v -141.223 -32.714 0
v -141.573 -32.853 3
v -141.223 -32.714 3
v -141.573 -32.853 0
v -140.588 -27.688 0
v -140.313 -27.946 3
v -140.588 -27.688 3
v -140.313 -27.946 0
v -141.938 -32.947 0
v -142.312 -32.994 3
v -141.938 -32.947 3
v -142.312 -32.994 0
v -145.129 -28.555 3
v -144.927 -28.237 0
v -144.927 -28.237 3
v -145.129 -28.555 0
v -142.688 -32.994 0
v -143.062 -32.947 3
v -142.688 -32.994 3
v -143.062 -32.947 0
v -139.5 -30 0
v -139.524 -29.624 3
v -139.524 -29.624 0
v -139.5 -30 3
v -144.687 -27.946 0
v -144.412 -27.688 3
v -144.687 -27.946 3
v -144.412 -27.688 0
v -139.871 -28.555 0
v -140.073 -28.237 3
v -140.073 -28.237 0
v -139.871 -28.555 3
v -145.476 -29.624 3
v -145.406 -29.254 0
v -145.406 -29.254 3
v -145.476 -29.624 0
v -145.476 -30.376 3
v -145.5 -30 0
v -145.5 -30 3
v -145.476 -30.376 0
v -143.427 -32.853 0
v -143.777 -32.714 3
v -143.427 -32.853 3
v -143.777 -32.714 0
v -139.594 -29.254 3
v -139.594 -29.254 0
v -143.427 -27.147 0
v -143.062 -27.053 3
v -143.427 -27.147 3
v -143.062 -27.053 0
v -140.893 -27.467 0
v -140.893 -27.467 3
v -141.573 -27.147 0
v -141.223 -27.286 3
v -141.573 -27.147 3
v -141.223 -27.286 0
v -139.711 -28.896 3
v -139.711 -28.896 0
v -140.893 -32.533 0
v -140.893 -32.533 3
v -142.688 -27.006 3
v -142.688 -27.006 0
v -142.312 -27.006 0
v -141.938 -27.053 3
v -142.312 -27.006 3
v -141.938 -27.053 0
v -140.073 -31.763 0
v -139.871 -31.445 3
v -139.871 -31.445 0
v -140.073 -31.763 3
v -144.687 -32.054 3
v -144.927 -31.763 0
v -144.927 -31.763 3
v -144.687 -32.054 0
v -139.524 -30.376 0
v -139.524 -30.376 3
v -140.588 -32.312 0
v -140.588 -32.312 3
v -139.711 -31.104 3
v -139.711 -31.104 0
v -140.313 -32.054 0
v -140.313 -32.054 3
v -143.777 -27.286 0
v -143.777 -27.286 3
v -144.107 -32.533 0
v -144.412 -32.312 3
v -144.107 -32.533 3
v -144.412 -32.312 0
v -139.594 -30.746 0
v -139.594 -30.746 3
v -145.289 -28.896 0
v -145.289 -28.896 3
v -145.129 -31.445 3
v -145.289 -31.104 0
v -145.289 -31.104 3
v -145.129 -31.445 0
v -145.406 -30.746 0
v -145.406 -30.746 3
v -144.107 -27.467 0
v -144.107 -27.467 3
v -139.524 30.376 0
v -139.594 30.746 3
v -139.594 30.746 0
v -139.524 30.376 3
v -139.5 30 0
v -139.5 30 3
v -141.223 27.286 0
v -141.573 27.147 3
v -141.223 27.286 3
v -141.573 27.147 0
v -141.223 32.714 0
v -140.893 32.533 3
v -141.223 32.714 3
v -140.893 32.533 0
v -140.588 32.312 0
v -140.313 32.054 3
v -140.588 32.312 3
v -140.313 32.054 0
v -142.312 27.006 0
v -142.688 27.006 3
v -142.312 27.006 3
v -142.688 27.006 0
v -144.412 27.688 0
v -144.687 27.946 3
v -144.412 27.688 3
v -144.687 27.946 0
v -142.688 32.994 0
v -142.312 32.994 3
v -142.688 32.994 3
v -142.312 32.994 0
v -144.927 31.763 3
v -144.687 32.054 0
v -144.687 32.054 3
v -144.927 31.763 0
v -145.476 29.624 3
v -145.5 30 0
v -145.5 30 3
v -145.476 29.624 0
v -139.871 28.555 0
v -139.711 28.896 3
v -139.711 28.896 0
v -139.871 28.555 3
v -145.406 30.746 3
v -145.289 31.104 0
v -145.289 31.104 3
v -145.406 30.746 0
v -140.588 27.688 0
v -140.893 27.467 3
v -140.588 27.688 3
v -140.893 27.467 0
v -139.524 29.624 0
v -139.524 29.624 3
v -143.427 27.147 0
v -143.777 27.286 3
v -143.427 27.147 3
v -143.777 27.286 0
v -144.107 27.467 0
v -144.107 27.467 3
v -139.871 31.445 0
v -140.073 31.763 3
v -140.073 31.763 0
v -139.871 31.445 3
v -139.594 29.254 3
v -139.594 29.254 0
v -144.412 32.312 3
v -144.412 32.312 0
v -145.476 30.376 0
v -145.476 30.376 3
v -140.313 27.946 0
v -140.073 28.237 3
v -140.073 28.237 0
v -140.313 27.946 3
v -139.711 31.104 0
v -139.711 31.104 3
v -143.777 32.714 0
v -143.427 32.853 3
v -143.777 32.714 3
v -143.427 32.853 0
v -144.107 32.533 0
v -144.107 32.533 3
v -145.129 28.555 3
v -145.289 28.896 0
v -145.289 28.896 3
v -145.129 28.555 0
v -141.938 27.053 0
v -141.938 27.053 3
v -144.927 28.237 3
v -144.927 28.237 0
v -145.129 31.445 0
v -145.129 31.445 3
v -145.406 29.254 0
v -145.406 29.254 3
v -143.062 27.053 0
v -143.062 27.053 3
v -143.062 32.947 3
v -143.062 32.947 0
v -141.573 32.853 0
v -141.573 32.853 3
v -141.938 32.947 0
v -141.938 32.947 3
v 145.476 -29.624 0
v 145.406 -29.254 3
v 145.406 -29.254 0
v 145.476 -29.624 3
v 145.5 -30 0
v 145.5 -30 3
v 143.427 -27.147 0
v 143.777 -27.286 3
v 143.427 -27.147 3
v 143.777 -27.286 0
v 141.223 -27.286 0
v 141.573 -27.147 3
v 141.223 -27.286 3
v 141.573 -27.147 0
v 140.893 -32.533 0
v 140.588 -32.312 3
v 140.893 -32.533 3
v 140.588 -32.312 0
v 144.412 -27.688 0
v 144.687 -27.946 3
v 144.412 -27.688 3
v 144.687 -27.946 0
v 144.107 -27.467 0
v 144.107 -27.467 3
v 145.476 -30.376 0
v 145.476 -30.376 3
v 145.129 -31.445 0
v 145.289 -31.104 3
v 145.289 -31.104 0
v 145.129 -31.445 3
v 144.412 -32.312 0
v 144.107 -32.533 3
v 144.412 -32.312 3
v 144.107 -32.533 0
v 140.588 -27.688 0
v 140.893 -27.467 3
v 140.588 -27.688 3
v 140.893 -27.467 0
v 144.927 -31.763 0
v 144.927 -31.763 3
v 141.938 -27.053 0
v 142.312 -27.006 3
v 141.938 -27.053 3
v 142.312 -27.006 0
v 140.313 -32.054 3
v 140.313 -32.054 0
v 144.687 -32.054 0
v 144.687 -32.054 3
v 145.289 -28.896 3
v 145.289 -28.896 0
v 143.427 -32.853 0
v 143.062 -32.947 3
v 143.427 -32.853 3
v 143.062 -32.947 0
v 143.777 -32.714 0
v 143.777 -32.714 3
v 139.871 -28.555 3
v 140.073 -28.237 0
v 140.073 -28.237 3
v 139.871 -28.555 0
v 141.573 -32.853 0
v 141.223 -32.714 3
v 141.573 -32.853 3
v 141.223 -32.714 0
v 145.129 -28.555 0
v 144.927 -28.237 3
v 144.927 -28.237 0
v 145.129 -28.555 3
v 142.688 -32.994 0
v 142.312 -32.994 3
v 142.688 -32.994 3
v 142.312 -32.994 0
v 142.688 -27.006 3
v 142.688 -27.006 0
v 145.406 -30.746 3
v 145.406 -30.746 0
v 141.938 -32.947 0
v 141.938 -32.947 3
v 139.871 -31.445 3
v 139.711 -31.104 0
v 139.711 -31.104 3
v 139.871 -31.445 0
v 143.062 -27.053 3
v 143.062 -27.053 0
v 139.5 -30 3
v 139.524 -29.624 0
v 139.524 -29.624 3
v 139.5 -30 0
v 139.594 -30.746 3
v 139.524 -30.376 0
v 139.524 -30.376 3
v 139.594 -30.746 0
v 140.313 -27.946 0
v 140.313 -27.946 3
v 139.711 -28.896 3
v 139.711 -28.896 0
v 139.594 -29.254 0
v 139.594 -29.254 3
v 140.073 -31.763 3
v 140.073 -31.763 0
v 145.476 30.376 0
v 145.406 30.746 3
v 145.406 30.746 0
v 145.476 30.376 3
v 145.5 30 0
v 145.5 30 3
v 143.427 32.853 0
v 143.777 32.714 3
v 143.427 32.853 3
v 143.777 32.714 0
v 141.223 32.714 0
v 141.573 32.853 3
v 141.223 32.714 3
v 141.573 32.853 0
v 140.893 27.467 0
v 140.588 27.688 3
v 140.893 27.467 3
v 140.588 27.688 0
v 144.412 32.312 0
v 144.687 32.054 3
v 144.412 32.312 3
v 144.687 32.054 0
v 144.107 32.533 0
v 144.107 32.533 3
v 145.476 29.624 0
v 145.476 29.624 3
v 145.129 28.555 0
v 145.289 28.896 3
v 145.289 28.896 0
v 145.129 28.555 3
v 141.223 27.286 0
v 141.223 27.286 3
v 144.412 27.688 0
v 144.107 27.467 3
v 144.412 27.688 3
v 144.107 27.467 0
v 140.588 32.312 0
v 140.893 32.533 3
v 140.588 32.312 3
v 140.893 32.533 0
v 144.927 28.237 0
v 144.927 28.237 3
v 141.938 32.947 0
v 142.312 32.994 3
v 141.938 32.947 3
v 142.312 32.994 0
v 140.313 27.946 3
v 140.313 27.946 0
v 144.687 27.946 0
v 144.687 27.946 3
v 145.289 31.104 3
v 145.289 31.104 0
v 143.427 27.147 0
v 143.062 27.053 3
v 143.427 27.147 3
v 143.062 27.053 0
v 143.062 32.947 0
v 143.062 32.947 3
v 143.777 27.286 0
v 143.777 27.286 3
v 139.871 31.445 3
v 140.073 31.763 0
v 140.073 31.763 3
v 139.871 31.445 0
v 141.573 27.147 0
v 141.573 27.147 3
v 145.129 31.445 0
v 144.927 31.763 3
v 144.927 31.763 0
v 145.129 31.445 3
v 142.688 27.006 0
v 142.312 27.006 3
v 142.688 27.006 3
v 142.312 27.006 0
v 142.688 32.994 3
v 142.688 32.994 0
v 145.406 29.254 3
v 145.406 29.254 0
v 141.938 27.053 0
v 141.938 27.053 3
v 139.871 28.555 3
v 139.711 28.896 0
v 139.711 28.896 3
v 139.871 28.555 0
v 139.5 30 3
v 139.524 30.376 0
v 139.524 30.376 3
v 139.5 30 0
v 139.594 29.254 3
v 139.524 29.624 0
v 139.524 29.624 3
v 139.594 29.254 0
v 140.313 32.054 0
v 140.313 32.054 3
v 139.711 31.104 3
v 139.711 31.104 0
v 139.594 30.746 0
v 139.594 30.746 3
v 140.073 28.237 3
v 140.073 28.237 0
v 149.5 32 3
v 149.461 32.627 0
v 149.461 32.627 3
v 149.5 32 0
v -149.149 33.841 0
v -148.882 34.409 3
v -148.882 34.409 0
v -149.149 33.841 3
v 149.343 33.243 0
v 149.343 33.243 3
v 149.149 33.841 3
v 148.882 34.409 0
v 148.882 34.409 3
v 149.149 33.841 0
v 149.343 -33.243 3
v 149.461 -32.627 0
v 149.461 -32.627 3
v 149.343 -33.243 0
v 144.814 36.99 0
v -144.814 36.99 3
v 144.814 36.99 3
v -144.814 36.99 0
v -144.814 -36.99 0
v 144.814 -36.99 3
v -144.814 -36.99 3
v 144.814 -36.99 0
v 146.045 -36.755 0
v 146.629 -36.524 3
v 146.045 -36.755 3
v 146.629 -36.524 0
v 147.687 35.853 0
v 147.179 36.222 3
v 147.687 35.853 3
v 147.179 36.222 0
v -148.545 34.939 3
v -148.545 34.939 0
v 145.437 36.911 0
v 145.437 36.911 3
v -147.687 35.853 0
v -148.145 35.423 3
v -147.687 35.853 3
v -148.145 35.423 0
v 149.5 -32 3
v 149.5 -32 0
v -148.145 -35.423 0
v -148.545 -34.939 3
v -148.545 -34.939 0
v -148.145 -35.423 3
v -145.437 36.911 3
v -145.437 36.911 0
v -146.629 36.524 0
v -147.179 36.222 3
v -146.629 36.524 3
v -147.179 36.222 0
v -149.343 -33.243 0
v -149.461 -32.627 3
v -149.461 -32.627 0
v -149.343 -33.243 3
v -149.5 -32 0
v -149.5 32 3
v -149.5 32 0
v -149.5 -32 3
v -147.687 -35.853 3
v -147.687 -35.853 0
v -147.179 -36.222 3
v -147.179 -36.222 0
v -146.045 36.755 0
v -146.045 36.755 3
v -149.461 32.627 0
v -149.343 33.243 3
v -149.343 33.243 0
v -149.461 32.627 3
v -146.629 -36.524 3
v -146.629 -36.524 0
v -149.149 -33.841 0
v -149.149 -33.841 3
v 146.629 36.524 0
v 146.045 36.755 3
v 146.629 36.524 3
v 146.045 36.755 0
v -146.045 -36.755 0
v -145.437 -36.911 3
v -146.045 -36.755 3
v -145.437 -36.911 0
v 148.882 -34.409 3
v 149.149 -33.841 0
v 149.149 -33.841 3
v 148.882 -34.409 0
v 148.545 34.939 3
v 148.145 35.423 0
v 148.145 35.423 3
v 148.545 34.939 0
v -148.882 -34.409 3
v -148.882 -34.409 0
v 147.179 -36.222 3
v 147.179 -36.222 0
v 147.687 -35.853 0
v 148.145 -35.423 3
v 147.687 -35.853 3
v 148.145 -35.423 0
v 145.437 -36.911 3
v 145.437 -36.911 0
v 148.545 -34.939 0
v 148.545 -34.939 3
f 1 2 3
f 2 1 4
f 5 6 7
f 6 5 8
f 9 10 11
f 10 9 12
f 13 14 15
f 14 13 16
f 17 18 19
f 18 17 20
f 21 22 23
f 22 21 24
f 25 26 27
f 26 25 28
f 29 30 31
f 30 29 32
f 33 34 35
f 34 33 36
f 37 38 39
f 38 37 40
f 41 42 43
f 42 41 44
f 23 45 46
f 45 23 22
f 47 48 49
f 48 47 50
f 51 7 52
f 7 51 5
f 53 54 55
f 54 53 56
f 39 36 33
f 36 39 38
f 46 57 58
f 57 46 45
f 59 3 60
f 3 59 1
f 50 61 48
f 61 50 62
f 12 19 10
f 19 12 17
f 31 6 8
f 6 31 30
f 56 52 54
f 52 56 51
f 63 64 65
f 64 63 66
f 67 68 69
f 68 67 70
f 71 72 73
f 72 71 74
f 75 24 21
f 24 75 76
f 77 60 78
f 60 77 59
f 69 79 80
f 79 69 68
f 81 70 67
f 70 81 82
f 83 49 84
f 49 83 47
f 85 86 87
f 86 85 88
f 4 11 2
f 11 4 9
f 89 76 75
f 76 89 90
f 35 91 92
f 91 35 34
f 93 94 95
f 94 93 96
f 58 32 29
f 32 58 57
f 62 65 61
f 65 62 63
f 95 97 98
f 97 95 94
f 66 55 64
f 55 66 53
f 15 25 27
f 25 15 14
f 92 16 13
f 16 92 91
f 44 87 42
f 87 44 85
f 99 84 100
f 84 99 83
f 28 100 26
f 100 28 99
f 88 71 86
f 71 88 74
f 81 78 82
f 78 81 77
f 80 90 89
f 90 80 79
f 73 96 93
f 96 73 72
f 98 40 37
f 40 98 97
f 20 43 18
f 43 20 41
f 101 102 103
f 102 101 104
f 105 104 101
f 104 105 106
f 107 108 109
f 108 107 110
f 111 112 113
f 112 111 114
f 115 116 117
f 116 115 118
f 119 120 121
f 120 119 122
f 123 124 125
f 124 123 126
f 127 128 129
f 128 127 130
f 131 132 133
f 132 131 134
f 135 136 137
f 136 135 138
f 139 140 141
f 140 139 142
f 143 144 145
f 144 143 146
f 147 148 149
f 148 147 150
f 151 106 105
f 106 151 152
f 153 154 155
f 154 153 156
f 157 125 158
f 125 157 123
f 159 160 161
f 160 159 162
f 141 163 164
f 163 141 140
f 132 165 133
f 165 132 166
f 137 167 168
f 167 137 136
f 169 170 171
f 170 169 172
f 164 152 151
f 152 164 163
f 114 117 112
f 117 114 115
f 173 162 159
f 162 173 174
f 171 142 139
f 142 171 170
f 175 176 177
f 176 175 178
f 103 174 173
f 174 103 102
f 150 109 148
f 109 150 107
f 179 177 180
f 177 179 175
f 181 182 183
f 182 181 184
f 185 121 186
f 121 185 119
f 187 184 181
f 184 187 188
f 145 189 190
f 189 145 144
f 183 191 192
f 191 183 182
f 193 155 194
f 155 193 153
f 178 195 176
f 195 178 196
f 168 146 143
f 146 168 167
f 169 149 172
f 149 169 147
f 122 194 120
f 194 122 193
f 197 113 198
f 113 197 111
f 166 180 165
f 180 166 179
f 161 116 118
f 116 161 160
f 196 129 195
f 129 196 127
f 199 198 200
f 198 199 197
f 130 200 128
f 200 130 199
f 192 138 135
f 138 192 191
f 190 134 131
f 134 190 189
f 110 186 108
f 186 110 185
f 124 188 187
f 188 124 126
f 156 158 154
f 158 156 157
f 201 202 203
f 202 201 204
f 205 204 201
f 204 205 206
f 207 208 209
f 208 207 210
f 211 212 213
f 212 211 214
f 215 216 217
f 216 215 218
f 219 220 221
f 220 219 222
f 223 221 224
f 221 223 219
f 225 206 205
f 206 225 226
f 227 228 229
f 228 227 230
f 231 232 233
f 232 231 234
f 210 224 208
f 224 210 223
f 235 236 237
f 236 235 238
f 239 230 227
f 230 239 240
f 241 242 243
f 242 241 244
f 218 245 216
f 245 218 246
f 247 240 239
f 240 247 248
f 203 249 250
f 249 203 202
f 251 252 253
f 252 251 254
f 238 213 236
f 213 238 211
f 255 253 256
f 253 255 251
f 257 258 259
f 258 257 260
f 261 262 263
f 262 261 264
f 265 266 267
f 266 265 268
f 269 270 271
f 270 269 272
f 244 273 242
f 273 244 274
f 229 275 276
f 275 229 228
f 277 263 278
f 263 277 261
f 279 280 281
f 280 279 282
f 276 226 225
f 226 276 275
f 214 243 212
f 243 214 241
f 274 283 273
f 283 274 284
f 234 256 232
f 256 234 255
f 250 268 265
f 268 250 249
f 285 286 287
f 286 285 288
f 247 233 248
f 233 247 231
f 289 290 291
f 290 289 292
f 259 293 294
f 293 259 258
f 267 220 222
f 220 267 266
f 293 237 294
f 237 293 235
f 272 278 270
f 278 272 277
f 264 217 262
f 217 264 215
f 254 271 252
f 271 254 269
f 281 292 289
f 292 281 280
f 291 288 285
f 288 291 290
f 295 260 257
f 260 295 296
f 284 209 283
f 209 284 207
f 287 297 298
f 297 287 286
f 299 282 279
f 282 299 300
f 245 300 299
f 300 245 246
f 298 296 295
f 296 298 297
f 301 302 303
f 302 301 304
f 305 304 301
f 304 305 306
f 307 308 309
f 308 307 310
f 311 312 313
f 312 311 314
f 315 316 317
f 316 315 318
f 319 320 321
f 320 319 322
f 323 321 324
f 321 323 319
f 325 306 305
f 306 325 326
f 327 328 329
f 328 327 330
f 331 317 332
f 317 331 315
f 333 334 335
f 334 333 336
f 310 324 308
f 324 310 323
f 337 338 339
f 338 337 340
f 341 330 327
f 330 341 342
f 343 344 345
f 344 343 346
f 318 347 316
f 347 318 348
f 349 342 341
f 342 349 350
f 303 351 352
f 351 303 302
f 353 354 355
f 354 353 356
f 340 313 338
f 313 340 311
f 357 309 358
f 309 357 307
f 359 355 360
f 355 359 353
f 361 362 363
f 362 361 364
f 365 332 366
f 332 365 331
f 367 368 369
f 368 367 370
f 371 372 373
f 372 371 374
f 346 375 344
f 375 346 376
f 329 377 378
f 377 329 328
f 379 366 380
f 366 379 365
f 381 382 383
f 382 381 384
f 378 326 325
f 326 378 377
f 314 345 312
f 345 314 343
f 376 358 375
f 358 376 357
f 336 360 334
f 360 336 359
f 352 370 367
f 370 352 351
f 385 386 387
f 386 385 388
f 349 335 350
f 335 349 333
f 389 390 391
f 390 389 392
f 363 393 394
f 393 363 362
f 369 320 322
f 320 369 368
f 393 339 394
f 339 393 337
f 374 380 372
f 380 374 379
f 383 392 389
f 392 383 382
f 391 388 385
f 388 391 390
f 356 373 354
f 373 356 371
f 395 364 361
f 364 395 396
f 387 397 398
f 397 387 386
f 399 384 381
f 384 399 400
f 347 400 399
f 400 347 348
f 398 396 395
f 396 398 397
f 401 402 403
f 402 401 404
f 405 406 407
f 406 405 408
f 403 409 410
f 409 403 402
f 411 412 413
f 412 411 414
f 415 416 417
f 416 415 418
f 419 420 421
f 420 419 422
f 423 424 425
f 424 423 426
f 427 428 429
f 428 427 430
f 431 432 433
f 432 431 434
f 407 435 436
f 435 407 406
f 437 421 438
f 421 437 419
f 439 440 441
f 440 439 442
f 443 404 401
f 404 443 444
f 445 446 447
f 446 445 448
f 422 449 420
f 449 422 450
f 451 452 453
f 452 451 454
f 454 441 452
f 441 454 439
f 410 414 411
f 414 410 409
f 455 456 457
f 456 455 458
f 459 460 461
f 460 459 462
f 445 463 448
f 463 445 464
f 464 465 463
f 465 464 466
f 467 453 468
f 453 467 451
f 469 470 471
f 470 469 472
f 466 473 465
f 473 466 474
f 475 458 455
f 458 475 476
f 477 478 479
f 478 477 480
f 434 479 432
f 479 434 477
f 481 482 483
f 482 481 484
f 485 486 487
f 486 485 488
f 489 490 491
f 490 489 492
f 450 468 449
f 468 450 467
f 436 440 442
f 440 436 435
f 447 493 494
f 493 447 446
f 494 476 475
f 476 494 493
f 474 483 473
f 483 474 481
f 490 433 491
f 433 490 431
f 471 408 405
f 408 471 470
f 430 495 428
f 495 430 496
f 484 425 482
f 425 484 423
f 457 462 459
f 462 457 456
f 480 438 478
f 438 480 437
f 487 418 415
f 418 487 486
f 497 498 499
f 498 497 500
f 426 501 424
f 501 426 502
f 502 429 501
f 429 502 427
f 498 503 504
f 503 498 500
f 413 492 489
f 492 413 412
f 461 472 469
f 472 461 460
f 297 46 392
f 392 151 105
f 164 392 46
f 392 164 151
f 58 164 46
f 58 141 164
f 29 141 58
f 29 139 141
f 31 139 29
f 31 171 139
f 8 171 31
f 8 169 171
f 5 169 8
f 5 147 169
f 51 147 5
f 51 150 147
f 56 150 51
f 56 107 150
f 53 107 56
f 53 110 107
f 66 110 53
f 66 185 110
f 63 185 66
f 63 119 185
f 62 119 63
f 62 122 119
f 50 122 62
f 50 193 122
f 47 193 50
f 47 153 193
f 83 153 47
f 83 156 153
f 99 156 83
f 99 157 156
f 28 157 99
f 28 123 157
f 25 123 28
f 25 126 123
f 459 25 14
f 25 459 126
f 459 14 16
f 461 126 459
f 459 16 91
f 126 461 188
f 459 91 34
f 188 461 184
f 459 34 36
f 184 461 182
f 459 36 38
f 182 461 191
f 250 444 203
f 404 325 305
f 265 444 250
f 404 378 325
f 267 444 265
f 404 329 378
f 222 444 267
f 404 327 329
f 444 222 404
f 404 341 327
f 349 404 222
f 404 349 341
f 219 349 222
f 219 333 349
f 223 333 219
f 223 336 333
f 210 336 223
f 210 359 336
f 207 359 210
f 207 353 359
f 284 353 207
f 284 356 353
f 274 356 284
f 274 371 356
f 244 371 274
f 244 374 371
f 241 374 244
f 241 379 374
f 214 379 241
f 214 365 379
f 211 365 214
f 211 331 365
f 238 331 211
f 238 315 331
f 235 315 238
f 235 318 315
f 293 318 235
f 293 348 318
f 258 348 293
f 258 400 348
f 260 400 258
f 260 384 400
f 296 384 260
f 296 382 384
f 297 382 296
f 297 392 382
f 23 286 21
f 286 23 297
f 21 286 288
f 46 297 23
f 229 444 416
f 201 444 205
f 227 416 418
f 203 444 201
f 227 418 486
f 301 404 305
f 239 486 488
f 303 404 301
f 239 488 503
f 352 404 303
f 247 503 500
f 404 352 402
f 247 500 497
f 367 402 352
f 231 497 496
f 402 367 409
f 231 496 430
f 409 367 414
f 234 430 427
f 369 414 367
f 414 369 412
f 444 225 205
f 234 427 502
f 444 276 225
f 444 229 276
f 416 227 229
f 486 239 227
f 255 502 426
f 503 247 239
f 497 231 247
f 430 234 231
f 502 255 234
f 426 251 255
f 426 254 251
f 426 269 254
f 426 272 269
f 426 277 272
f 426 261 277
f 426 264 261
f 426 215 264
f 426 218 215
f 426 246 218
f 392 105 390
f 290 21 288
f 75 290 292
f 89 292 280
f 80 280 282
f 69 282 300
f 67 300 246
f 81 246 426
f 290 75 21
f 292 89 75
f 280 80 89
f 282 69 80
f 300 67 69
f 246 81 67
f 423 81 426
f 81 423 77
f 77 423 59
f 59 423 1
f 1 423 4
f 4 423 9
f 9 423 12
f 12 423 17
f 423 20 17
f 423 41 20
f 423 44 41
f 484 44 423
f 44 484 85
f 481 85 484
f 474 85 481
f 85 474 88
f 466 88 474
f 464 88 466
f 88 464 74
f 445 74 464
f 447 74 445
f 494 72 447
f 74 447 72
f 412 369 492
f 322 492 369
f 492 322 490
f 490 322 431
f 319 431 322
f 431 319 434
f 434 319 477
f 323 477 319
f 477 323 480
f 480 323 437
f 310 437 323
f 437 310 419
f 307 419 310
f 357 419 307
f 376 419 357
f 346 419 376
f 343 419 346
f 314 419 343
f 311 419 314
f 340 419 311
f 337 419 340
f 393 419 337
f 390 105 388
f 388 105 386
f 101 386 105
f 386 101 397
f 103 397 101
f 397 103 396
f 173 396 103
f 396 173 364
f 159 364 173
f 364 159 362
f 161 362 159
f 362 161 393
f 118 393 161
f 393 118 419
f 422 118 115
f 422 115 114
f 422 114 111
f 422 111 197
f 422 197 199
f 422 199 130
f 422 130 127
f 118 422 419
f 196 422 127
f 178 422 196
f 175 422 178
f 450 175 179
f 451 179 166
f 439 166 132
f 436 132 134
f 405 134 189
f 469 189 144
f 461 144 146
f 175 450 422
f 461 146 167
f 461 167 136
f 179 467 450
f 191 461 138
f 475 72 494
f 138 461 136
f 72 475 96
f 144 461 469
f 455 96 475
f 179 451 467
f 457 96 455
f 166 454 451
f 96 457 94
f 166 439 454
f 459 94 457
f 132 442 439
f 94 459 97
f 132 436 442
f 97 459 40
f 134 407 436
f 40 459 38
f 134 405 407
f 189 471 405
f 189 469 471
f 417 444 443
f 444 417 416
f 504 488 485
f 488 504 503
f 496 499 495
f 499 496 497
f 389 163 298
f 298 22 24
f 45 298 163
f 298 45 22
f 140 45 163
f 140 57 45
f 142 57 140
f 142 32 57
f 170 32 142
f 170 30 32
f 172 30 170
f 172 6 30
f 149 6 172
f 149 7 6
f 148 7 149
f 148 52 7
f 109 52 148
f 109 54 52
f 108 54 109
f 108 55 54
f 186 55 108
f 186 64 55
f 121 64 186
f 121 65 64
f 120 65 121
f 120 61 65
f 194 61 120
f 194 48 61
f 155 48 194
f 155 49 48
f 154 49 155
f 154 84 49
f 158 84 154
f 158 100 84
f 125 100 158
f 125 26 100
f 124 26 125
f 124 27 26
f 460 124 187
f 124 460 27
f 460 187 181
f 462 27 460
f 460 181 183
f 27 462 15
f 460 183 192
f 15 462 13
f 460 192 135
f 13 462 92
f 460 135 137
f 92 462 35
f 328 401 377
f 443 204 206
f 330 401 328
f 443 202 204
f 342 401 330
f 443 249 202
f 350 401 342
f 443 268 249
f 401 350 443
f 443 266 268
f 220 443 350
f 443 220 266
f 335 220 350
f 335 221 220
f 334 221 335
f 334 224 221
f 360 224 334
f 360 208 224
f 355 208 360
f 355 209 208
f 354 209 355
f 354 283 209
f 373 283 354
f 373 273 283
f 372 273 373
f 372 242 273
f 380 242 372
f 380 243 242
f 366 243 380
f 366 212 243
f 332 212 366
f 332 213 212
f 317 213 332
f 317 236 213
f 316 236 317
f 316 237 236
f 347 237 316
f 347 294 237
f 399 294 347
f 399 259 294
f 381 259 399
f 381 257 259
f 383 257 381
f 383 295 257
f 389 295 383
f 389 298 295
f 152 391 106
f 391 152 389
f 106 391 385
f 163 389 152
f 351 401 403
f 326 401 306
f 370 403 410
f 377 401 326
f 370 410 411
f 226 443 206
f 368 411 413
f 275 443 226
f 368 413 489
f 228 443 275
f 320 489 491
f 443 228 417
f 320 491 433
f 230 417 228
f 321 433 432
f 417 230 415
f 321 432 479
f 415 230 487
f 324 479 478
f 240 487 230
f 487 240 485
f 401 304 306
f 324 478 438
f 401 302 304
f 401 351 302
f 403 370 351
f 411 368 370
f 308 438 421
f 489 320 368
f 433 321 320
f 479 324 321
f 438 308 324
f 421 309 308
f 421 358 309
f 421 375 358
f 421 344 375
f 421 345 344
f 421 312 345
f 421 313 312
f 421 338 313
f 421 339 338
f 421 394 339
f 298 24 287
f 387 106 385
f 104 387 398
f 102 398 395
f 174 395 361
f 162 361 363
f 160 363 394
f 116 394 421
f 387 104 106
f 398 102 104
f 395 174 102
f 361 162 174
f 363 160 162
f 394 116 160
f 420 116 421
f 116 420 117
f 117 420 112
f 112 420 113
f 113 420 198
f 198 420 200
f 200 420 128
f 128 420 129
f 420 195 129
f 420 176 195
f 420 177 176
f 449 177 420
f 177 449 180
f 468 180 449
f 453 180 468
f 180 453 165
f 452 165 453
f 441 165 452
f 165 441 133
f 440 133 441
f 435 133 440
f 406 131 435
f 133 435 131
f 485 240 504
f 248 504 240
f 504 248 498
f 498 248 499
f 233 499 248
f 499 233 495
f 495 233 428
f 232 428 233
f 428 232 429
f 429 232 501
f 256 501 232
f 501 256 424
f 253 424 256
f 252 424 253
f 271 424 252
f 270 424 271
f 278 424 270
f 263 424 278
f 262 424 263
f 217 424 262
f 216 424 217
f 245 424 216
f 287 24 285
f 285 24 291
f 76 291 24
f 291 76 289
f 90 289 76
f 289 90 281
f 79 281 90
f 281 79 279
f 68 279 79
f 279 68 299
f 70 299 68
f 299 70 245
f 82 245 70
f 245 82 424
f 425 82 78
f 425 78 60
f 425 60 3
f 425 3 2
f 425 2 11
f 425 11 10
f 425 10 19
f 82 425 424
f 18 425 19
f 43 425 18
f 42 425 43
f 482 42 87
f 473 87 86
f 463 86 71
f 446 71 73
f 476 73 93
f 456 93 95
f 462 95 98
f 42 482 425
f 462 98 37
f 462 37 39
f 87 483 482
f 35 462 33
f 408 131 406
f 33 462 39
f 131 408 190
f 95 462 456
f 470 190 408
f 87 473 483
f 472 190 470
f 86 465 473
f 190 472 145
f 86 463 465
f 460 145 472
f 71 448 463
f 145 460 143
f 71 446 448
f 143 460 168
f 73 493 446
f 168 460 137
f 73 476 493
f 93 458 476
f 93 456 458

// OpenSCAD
$fn = 50;


difference() {
	union() {
		hull() {
			translate(v = [-144.5000000000, 32.0000000000, 0]) {
				cylinder(h = 3, r = 5);
			}
			translate(v = [144.5000000000, 32.0000000000, 0]) {
				cylinder(h = 3, r = 5);
			}
			translate(v = [-144.5000000000, -32.0000000000, 0]) {
				cylinder(h = 3, r = 5);
			}
			translate(v = [144.5000000000, -32.0000000000, 0]) {
				cylinder(h = 3, r = 5);
			}
		}
	}
	union() {
		translate(v = [-142.5000000000, -30.0000000000, -100.0000000000]) {
			cylinder(h = 200, r = 3.0000000000);
		}
		translate(v = [-142.5000000000, 30.0000000000, -100.0000000000]) {
			cylinder(h = 200, r = 3.0000000000);
		}
		translate(v = [142.5000000000, -30.0000000000, -100.0000000000]) {
			cylinder(h = 200, r = 3.0000000000);
		}
		translate(v = [142.5000000000, 30.0000000000, -100.0000000000]) {
			cylinder(h = 200, r = 3.0000000000);
		}
	}
}
